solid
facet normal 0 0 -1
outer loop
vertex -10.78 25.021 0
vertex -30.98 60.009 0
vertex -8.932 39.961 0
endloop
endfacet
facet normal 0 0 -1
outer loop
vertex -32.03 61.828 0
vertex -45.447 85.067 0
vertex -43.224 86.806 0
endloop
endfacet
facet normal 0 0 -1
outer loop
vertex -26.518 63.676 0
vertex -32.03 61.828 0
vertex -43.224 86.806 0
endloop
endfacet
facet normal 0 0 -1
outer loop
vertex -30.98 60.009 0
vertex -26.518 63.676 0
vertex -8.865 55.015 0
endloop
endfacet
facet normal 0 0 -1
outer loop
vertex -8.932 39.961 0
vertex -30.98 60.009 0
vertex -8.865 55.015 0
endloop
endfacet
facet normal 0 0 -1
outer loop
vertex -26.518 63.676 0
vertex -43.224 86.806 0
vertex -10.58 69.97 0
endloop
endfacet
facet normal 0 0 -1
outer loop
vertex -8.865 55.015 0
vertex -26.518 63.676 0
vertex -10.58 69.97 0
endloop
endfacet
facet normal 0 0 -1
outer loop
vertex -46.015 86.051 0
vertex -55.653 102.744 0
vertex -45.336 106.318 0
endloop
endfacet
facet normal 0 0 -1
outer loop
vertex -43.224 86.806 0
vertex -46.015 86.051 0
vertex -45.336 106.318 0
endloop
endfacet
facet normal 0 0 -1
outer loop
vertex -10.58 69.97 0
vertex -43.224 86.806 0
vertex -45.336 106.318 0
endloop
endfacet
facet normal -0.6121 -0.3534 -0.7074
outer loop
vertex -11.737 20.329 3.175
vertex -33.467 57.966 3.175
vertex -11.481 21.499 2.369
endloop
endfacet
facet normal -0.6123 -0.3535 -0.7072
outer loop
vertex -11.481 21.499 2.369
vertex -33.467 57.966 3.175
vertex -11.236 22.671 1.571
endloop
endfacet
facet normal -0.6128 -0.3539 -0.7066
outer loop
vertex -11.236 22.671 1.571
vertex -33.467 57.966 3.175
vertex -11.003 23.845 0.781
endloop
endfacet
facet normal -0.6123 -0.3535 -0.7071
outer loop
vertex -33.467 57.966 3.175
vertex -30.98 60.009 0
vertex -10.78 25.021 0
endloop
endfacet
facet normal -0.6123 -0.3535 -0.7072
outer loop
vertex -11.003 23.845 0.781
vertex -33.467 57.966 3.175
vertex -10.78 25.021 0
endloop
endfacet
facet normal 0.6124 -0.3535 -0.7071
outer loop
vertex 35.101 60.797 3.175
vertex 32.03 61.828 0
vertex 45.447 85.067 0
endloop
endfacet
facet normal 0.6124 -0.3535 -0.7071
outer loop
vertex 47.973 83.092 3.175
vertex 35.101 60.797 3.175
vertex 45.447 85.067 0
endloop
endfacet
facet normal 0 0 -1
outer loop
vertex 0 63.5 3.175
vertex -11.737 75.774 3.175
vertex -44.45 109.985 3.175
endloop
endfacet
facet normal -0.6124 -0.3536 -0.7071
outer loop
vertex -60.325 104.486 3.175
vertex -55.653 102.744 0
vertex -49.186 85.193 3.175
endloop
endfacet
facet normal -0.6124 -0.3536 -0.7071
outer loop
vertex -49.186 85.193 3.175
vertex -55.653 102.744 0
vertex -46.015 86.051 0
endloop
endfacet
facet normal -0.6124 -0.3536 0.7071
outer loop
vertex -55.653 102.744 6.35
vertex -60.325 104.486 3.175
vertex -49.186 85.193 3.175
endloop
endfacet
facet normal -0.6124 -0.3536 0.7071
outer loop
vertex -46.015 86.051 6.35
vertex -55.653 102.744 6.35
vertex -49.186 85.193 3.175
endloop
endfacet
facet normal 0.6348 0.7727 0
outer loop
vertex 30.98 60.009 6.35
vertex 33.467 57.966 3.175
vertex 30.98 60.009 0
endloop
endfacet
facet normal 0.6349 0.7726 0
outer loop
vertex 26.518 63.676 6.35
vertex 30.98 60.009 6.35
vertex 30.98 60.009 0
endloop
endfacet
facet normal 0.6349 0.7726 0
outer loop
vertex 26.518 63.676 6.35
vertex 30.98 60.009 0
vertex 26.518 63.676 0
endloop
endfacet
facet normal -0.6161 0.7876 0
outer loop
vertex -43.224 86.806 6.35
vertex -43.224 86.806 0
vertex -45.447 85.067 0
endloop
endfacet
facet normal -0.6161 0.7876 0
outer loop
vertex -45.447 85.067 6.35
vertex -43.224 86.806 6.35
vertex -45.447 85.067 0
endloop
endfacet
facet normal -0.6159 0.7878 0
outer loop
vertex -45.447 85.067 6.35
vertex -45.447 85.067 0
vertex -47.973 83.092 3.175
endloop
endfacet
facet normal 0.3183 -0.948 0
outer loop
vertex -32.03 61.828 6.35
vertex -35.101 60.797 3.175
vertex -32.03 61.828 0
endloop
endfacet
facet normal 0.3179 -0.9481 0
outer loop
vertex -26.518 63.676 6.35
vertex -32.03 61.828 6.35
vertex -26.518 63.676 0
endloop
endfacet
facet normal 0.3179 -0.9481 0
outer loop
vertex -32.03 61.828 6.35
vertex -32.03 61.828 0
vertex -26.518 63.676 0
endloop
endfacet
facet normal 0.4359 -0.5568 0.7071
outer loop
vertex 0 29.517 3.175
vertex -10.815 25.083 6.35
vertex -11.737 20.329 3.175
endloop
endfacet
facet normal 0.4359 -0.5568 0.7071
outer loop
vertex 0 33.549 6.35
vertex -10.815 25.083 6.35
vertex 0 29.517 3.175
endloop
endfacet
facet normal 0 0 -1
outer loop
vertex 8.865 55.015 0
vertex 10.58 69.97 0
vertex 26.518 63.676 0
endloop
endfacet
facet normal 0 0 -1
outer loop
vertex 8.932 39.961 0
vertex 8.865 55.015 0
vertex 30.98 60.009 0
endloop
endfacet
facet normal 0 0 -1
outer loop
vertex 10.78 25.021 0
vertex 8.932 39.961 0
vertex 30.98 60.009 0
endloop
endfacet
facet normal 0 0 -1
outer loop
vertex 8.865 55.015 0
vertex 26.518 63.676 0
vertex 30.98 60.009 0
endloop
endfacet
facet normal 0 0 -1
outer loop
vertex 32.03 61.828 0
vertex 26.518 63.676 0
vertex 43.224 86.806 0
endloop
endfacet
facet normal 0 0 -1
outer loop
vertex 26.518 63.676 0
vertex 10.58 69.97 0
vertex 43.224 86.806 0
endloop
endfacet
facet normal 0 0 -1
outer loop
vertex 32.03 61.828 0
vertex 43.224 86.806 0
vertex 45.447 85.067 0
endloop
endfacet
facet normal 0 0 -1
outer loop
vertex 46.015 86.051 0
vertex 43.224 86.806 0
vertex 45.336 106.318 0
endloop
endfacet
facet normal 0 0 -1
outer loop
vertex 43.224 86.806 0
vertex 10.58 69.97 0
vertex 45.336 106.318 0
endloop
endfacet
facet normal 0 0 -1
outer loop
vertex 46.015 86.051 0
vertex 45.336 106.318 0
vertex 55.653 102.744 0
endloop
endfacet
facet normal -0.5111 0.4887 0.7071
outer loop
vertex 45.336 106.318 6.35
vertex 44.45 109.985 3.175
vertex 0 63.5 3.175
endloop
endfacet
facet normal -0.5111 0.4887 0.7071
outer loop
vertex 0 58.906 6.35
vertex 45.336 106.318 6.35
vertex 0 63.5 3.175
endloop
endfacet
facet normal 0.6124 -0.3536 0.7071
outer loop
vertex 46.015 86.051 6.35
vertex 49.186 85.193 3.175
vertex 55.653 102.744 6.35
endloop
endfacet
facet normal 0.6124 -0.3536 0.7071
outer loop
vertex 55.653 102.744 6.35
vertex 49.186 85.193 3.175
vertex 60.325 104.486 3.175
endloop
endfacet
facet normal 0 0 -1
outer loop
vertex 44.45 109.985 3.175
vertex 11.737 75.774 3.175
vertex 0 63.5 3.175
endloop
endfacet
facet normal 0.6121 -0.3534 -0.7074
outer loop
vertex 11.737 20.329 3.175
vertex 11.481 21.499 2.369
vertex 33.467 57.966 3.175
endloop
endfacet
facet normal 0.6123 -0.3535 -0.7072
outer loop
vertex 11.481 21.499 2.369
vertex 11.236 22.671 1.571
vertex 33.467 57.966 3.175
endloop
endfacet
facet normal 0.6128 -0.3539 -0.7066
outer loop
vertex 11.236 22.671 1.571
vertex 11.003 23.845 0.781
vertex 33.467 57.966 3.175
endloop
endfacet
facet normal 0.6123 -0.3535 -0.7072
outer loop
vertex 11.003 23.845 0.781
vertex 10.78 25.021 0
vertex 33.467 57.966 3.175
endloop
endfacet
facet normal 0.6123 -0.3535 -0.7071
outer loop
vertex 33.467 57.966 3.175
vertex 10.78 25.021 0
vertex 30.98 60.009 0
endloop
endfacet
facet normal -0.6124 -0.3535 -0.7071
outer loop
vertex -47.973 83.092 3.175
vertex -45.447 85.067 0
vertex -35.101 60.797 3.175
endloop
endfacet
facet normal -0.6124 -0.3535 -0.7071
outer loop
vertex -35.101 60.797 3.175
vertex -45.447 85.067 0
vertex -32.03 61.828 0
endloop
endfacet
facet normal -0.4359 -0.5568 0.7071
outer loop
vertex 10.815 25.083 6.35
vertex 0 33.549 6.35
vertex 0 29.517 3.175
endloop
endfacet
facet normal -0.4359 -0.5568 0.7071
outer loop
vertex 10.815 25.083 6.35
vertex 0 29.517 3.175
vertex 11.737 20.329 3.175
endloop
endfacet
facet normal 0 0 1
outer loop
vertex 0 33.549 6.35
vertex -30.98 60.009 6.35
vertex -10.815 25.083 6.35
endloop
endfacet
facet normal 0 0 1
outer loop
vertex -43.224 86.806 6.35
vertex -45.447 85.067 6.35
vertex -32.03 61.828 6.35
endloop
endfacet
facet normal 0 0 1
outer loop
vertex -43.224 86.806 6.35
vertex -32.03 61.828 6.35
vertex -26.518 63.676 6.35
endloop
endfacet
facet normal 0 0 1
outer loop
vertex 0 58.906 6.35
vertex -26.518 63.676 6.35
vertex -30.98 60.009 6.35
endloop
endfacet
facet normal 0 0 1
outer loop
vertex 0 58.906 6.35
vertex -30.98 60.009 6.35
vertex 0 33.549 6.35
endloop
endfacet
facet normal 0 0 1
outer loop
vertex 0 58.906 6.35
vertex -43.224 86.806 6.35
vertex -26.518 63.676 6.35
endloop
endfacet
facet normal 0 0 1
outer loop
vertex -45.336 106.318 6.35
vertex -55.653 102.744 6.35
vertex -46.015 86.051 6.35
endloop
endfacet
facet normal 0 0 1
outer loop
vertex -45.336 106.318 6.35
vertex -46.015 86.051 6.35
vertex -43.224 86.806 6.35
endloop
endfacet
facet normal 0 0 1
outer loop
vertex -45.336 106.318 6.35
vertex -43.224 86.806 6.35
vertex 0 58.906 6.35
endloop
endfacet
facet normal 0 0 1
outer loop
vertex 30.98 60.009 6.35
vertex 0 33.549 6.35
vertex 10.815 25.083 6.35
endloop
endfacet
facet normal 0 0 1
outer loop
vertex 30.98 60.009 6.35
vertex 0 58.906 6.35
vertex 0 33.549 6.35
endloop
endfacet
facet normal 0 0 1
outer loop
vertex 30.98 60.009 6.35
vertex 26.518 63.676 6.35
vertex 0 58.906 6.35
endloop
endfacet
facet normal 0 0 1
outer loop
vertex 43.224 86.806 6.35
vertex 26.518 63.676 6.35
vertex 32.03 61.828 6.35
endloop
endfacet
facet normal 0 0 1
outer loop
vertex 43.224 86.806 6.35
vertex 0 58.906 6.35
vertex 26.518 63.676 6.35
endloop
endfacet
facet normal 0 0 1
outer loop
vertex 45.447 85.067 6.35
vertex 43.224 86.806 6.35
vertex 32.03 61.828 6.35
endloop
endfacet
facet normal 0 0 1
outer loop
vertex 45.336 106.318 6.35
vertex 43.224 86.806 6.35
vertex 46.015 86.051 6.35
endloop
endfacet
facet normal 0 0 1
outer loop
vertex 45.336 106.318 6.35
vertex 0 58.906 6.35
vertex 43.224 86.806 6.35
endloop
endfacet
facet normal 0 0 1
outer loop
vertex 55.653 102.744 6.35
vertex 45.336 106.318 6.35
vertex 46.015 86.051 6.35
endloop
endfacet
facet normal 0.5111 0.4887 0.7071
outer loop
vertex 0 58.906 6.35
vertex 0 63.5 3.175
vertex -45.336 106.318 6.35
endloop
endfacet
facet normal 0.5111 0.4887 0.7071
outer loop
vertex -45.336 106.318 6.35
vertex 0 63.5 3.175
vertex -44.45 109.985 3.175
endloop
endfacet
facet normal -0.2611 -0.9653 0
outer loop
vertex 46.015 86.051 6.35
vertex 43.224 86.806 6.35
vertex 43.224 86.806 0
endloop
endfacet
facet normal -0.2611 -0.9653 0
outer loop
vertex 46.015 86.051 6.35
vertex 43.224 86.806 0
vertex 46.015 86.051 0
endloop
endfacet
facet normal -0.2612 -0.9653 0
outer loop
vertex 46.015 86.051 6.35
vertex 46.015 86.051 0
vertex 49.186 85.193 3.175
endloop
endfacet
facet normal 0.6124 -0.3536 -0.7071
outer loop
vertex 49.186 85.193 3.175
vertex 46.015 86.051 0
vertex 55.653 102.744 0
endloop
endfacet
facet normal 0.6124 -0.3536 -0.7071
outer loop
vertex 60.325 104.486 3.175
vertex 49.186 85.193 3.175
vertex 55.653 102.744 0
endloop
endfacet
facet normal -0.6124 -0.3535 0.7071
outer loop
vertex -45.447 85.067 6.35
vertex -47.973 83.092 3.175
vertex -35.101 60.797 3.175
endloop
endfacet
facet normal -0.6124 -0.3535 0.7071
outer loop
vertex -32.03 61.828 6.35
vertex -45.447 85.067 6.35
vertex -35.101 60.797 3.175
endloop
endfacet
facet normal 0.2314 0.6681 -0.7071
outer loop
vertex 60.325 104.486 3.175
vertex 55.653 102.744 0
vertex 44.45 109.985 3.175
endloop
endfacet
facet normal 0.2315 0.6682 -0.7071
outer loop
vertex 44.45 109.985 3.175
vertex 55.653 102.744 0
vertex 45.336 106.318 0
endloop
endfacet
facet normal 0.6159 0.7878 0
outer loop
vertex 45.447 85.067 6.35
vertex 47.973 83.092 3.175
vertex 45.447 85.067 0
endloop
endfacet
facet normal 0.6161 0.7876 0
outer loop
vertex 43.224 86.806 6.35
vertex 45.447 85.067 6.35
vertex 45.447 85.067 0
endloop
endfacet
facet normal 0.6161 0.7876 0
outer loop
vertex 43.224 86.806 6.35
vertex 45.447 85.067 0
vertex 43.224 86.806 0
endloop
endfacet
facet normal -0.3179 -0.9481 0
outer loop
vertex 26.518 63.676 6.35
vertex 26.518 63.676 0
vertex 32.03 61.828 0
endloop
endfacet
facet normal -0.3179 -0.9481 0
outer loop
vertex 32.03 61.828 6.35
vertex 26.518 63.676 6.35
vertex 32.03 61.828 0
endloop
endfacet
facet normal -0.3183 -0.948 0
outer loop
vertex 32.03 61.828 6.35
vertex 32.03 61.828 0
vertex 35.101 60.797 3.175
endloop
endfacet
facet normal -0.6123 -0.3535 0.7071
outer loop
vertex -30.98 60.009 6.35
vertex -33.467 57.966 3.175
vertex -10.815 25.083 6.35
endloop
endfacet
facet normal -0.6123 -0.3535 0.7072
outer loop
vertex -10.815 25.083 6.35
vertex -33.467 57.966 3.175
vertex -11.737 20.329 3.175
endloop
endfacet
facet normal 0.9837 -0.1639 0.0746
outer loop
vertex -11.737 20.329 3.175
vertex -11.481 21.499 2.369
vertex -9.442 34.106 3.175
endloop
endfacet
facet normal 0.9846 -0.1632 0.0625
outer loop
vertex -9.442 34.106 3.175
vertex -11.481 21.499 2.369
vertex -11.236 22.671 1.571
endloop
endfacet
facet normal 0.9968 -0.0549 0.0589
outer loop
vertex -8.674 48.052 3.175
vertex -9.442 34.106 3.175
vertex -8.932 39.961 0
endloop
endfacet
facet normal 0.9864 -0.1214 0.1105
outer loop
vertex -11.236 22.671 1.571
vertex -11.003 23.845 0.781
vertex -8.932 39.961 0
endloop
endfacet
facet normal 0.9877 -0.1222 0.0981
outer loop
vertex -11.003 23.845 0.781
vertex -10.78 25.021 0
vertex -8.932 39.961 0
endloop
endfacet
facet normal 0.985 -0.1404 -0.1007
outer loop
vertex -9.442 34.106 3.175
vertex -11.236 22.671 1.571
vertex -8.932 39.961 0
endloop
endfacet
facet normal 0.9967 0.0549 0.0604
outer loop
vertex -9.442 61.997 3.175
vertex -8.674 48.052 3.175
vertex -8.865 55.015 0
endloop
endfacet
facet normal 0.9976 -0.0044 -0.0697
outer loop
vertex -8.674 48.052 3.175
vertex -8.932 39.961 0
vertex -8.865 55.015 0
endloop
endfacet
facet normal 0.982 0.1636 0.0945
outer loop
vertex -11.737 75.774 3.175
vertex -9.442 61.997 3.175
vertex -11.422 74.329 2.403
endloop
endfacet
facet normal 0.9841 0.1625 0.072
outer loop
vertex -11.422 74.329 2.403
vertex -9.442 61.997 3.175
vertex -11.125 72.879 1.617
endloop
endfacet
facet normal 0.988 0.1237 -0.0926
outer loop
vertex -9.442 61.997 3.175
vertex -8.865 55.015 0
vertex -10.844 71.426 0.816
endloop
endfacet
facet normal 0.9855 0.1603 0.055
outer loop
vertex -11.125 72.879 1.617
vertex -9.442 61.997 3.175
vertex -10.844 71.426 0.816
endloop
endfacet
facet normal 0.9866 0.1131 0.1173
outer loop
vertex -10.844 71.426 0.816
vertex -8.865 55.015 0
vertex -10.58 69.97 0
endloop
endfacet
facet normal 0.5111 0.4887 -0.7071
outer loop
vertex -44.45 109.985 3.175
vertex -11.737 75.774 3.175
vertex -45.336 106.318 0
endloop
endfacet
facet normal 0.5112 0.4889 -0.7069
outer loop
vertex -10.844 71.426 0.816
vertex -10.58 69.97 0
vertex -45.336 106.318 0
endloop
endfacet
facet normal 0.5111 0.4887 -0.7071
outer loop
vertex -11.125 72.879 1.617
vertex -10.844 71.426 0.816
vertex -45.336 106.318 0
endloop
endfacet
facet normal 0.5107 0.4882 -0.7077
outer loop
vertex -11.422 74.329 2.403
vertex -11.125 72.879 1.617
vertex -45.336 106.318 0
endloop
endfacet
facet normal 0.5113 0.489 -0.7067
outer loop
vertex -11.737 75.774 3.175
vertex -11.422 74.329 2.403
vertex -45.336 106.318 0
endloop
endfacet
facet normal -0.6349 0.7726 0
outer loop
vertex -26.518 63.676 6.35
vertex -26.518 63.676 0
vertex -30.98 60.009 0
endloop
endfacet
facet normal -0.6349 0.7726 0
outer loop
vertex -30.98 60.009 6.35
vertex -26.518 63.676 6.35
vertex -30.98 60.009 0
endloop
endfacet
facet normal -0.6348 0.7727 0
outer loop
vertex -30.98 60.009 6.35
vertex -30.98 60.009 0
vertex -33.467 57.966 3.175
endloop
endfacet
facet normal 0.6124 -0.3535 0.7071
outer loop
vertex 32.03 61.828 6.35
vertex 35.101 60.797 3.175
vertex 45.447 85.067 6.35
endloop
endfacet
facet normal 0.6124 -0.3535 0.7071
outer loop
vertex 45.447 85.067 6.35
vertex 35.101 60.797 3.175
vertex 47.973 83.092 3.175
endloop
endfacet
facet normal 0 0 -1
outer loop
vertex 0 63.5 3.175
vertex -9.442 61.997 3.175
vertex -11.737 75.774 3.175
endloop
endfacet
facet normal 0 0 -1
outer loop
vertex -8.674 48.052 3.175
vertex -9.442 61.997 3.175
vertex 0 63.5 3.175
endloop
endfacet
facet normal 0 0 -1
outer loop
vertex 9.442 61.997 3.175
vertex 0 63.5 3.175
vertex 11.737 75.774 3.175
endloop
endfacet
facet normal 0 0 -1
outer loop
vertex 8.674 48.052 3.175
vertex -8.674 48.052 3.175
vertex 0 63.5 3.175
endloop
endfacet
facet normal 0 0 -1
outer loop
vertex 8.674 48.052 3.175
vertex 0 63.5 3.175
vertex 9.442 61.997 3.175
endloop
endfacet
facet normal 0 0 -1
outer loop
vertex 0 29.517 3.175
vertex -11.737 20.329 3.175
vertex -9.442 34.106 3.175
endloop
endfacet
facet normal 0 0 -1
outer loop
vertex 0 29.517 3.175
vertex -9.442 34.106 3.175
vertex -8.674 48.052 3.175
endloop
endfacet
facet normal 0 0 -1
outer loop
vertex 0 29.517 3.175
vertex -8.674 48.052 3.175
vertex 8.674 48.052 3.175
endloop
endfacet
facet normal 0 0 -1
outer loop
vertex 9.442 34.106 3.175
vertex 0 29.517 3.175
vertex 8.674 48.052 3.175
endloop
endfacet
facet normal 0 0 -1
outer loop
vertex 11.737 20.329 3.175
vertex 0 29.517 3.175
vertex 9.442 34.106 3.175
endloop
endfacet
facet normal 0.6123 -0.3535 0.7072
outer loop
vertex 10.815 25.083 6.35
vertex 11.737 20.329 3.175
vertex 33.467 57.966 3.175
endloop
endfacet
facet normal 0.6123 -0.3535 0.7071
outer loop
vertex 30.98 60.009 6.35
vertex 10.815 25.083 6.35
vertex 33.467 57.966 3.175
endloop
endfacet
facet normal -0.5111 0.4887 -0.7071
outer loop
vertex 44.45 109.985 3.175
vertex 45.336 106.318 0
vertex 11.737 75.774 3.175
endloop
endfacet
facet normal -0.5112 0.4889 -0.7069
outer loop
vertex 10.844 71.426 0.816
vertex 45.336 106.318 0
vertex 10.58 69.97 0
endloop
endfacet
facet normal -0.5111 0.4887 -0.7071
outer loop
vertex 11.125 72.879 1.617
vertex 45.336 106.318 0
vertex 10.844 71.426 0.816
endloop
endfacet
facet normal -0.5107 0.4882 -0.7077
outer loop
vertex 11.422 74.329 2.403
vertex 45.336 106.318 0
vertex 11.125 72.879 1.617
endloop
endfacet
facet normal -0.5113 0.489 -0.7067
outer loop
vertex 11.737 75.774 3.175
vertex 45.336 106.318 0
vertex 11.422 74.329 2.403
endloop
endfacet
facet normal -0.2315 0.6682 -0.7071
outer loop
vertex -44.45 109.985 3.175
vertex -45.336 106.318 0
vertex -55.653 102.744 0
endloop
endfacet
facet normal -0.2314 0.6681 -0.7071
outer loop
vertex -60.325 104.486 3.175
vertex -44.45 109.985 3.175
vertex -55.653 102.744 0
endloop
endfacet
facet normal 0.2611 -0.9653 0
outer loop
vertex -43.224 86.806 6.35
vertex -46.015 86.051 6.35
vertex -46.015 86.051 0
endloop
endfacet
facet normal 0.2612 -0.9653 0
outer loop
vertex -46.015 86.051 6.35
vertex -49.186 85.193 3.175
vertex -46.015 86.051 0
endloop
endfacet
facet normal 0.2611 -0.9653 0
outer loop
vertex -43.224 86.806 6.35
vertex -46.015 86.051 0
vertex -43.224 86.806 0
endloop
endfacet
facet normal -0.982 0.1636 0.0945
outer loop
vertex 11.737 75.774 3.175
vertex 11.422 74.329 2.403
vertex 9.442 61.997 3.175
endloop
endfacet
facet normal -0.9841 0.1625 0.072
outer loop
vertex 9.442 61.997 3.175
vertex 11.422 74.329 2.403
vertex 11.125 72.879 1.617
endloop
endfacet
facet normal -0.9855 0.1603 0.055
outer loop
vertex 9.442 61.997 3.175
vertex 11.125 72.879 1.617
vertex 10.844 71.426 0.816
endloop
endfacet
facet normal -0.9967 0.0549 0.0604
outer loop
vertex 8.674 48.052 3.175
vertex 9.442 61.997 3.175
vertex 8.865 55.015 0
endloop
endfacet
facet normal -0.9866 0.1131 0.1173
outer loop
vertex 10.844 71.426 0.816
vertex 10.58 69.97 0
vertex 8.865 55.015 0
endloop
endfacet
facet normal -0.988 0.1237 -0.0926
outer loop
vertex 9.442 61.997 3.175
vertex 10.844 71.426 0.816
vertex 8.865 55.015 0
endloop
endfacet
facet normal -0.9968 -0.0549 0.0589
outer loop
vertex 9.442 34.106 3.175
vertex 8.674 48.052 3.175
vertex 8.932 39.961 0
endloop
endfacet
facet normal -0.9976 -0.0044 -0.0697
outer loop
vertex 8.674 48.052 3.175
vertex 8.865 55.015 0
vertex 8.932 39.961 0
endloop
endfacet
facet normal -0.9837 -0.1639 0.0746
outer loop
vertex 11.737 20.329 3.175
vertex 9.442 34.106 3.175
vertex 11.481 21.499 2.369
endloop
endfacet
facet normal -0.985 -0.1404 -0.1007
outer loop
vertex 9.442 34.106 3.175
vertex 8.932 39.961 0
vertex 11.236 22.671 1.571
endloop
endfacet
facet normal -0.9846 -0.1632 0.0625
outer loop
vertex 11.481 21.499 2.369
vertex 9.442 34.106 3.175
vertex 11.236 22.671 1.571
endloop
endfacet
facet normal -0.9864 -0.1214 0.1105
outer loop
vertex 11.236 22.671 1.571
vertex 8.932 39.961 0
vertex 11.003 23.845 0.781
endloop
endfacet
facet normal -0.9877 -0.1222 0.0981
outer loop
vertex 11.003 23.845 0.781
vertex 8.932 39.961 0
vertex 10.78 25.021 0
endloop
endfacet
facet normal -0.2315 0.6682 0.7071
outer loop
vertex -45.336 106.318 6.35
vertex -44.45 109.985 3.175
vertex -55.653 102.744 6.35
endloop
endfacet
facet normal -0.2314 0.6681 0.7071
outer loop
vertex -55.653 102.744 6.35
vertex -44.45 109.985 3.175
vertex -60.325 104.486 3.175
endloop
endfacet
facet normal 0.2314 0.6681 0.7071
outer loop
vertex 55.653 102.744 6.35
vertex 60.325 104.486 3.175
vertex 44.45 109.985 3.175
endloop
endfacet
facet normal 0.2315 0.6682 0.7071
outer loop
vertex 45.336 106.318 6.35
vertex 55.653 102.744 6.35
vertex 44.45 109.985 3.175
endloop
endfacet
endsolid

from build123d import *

# Parameters (mm, degrees)
F1_DEPTH = 6.35
F3_DEPTH = 3.175
F4_SIZE  = 3.17499


# Not quite as in the source:
# - a fillet or chamfer is up to 0.001 mm smaller than in the source, because OpenCascade refuses the exact size


with BuildPart() as f1:
    # F0 (on Top) → F1 (new body)
    with BuildSketch(Plane.XY):
        Polygon((-21.1028610796, 36.5512275749), (-11.7370359251, 20.3291425525), (0, 29.516665265), (11.7370359251, 20.3291425525), (33.4666037048, 57.9658579735), (26.5181194991, 63.6764243245), (35.1014384706, 60.7974748498), (47.9729409095, 83.0915710438), (43.2239025831, 86.8056491017), (49.1863254635, 85.1932147405), (60.325, 104.4859649666), (44.45, 109.9852262806), (0, 63.5), (-44.45, 109.9852262806), (-60.325, 104.4859649666), (-49.1863254635, 85.1932147405), (-43.2239025831, 86.8056491017), (-47.9729409095, 83.0915710438), (-35.1014384706, 60.7974748498), (-26.5181194991, 63.6764243245), (-33.4666037048, 57.9658579735), align=None)
    extrude(amount=F1_DEPTH)

    # F2 (on face) → F3 (cut)
    with BuildSketch(Plane(origin=(0, 0, 0), x_dir=(1, 0, 0), z_dir=(0, 0, -1))):
        with BuildLine():
            ThreePointArc((11.7370359251, -75.7744380392), (8.6743378245, -48.0517902958), (11.7370359251, -20.3291425525))
            Line((11.7370359251, -20.3291425525), (0, -29.516665265))
            Line((0, -29.516665265), (-11.7370359251, -20.3291425525))
            ThreePointArc((-11.7370359251, -20.3291425525), (-8.6743378245, -48.0517902958), (-11.7370359251, -75.7744380392))
            Line((-11.7370359251, -75.7744380392), (0, -63.5))
            Line((0, -63.5), (11.7370359251, -75.7744380392))
        make_face()
        Polygon((-11.7370359251, -75.7744380392), (11.7370359251, -75.7744380392), (0, -63.5), align=None)
        Polygon((0, -29.516665265), (11.7370359251, -20.3291425525), (-11.7370359251, -20.3291425525), align=None)
    extrude(amount=-F3_DEPTH, mode=Mode.SUBTRACT)

    # F4 (size 3.175 in the source; OpenCascade refuses exactly that, so slightly less here)
    f4_edges = [f1.edges().sort_by_distance(p)[0] for p in [
        (22.60182, 39.1475, 6.35),
        (22.60182, 39.1475, 0),
        (41.53719, 71.944523, 6.35),
        (41.53719, 71.944523, 0),
        (54.755663, 94.83959, 6.35),
        (54.755663, 94.83959, 0),
        (52.3875, 107.235596, 6.35),
        (52.3875, 107.235596, 0),
        (22.225, 86.742613, 6.35),
        (28.093518, 92.879832, 0),
        (5.868518, 24.922904, 6.35),
        (-5.868518, 24.922904, 6.35),
        (-22.225, 86.742613, 6.35),
        (-28.093518, 92.879832, 0),
        (-52.3875, 107.235596, 6.35),
        (-52.3875, 107.235596, 0),
        (-54.755663, 94.83959, 6.35),
        (-54.755663, 94.83959, 0),
        (-41.53719, 71.944523, 6.35),
        (-41.53719, 71.944523, 0),
        (-22.60182, 39.1475, 6.35),
        (-22.60182, 39.1475, 0),
    ]]
    chamfer(f4_edges, length=F4_SIZE)


solid = f1.part
